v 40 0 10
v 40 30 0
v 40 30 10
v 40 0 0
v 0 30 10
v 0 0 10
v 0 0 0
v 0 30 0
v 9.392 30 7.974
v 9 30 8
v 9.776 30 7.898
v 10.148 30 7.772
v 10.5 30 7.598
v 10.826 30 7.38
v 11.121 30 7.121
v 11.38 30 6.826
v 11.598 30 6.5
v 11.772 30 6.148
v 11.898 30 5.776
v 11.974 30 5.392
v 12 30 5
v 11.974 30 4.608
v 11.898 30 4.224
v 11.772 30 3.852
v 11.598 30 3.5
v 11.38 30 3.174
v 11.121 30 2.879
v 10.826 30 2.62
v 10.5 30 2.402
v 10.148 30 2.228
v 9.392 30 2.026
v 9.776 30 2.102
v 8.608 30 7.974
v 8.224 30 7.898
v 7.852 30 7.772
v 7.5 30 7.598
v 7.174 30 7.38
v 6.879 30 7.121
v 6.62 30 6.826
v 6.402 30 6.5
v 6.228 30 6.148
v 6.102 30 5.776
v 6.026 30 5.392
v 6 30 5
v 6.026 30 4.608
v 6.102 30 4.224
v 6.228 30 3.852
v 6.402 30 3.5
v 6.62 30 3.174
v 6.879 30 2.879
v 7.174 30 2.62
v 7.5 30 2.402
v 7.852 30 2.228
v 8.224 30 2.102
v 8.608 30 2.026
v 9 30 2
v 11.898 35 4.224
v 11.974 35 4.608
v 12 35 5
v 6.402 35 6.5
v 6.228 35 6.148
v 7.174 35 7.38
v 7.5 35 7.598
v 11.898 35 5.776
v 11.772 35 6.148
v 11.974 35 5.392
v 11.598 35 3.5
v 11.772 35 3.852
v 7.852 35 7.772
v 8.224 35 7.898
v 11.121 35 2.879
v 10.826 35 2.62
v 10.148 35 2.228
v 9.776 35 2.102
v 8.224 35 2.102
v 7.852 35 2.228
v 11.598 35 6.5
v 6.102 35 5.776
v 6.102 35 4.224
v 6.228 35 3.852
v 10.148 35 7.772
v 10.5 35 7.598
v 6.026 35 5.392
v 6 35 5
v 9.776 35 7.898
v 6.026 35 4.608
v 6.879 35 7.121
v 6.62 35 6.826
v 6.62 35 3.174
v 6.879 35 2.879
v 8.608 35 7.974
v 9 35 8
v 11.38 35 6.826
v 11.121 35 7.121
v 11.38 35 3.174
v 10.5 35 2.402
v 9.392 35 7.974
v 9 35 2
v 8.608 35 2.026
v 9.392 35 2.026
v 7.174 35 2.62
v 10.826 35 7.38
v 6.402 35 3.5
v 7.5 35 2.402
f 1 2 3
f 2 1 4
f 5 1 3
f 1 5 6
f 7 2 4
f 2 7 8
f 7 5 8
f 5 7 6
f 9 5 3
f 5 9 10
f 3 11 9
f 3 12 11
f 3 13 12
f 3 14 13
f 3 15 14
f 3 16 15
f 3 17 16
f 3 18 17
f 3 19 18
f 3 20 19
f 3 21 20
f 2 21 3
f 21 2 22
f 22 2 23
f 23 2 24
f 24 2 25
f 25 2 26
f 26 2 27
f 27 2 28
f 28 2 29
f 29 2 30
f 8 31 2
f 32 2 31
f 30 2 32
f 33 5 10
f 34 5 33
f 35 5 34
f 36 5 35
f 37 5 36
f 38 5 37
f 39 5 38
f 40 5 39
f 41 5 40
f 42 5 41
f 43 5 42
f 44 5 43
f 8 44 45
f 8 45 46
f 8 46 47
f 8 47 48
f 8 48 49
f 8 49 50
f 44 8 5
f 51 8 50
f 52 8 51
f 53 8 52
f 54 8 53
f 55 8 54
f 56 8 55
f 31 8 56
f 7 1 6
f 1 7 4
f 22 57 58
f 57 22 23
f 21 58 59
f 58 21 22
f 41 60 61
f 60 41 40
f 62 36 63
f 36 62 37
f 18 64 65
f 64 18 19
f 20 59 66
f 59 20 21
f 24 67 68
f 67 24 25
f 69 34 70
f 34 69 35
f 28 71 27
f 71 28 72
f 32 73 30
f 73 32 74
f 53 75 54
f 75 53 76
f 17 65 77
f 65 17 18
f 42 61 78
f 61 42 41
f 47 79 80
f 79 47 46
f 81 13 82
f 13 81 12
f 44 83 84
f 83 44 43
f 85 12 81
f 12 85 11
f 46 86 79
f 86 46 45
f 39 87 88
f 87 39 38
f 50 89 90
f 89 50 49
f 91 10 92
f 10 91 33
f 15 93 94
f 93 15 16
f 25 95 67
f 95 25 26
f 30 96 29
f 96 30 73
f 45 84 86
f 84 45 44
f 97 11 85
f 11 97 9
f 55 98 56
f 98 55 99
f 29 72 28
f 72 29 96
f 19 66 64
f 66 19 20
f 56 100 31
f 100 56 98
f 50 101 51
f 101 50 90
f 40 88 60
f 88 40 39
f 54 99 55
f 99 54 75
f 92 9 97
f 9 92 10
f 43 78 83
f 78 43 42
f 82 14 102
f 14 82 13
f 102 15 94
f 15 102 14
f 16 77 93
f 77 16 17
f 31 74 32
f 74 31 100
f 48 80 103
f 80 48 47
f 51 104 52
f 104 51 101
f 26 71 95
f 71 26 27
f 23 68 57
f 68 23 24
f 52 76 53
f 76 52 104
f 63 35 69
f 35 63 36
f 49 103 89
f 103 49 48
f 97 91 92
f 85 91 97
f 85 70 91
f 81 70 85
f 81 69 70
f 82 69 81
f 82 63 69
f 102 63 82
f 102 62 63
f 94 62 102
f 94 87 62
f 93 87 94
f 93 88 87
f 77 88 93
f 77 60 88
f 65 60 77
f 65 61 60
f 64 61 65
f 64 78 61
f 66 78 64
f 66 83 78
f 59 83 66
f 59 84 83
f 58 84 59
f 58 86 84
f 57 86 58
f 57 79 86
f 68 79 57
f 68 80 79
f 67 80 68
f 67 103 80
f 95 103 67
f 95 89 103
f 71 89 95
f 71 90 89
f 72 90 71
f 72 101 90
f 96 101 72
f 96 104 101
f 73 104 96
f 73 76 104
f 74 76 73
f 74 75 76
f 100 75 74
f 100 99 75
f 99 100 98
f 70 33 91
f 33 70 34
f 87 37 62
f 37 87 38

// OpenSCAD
// units=mm — generated by scad_emitter.py
// part=unnamed
$fn = 48;

union() { cube([40, 30, 10]); translate([9, 29.5, 5]) rotate([-90, 0, 0]) cylinder(h=5.5, r=3, $fn=$fn); }
